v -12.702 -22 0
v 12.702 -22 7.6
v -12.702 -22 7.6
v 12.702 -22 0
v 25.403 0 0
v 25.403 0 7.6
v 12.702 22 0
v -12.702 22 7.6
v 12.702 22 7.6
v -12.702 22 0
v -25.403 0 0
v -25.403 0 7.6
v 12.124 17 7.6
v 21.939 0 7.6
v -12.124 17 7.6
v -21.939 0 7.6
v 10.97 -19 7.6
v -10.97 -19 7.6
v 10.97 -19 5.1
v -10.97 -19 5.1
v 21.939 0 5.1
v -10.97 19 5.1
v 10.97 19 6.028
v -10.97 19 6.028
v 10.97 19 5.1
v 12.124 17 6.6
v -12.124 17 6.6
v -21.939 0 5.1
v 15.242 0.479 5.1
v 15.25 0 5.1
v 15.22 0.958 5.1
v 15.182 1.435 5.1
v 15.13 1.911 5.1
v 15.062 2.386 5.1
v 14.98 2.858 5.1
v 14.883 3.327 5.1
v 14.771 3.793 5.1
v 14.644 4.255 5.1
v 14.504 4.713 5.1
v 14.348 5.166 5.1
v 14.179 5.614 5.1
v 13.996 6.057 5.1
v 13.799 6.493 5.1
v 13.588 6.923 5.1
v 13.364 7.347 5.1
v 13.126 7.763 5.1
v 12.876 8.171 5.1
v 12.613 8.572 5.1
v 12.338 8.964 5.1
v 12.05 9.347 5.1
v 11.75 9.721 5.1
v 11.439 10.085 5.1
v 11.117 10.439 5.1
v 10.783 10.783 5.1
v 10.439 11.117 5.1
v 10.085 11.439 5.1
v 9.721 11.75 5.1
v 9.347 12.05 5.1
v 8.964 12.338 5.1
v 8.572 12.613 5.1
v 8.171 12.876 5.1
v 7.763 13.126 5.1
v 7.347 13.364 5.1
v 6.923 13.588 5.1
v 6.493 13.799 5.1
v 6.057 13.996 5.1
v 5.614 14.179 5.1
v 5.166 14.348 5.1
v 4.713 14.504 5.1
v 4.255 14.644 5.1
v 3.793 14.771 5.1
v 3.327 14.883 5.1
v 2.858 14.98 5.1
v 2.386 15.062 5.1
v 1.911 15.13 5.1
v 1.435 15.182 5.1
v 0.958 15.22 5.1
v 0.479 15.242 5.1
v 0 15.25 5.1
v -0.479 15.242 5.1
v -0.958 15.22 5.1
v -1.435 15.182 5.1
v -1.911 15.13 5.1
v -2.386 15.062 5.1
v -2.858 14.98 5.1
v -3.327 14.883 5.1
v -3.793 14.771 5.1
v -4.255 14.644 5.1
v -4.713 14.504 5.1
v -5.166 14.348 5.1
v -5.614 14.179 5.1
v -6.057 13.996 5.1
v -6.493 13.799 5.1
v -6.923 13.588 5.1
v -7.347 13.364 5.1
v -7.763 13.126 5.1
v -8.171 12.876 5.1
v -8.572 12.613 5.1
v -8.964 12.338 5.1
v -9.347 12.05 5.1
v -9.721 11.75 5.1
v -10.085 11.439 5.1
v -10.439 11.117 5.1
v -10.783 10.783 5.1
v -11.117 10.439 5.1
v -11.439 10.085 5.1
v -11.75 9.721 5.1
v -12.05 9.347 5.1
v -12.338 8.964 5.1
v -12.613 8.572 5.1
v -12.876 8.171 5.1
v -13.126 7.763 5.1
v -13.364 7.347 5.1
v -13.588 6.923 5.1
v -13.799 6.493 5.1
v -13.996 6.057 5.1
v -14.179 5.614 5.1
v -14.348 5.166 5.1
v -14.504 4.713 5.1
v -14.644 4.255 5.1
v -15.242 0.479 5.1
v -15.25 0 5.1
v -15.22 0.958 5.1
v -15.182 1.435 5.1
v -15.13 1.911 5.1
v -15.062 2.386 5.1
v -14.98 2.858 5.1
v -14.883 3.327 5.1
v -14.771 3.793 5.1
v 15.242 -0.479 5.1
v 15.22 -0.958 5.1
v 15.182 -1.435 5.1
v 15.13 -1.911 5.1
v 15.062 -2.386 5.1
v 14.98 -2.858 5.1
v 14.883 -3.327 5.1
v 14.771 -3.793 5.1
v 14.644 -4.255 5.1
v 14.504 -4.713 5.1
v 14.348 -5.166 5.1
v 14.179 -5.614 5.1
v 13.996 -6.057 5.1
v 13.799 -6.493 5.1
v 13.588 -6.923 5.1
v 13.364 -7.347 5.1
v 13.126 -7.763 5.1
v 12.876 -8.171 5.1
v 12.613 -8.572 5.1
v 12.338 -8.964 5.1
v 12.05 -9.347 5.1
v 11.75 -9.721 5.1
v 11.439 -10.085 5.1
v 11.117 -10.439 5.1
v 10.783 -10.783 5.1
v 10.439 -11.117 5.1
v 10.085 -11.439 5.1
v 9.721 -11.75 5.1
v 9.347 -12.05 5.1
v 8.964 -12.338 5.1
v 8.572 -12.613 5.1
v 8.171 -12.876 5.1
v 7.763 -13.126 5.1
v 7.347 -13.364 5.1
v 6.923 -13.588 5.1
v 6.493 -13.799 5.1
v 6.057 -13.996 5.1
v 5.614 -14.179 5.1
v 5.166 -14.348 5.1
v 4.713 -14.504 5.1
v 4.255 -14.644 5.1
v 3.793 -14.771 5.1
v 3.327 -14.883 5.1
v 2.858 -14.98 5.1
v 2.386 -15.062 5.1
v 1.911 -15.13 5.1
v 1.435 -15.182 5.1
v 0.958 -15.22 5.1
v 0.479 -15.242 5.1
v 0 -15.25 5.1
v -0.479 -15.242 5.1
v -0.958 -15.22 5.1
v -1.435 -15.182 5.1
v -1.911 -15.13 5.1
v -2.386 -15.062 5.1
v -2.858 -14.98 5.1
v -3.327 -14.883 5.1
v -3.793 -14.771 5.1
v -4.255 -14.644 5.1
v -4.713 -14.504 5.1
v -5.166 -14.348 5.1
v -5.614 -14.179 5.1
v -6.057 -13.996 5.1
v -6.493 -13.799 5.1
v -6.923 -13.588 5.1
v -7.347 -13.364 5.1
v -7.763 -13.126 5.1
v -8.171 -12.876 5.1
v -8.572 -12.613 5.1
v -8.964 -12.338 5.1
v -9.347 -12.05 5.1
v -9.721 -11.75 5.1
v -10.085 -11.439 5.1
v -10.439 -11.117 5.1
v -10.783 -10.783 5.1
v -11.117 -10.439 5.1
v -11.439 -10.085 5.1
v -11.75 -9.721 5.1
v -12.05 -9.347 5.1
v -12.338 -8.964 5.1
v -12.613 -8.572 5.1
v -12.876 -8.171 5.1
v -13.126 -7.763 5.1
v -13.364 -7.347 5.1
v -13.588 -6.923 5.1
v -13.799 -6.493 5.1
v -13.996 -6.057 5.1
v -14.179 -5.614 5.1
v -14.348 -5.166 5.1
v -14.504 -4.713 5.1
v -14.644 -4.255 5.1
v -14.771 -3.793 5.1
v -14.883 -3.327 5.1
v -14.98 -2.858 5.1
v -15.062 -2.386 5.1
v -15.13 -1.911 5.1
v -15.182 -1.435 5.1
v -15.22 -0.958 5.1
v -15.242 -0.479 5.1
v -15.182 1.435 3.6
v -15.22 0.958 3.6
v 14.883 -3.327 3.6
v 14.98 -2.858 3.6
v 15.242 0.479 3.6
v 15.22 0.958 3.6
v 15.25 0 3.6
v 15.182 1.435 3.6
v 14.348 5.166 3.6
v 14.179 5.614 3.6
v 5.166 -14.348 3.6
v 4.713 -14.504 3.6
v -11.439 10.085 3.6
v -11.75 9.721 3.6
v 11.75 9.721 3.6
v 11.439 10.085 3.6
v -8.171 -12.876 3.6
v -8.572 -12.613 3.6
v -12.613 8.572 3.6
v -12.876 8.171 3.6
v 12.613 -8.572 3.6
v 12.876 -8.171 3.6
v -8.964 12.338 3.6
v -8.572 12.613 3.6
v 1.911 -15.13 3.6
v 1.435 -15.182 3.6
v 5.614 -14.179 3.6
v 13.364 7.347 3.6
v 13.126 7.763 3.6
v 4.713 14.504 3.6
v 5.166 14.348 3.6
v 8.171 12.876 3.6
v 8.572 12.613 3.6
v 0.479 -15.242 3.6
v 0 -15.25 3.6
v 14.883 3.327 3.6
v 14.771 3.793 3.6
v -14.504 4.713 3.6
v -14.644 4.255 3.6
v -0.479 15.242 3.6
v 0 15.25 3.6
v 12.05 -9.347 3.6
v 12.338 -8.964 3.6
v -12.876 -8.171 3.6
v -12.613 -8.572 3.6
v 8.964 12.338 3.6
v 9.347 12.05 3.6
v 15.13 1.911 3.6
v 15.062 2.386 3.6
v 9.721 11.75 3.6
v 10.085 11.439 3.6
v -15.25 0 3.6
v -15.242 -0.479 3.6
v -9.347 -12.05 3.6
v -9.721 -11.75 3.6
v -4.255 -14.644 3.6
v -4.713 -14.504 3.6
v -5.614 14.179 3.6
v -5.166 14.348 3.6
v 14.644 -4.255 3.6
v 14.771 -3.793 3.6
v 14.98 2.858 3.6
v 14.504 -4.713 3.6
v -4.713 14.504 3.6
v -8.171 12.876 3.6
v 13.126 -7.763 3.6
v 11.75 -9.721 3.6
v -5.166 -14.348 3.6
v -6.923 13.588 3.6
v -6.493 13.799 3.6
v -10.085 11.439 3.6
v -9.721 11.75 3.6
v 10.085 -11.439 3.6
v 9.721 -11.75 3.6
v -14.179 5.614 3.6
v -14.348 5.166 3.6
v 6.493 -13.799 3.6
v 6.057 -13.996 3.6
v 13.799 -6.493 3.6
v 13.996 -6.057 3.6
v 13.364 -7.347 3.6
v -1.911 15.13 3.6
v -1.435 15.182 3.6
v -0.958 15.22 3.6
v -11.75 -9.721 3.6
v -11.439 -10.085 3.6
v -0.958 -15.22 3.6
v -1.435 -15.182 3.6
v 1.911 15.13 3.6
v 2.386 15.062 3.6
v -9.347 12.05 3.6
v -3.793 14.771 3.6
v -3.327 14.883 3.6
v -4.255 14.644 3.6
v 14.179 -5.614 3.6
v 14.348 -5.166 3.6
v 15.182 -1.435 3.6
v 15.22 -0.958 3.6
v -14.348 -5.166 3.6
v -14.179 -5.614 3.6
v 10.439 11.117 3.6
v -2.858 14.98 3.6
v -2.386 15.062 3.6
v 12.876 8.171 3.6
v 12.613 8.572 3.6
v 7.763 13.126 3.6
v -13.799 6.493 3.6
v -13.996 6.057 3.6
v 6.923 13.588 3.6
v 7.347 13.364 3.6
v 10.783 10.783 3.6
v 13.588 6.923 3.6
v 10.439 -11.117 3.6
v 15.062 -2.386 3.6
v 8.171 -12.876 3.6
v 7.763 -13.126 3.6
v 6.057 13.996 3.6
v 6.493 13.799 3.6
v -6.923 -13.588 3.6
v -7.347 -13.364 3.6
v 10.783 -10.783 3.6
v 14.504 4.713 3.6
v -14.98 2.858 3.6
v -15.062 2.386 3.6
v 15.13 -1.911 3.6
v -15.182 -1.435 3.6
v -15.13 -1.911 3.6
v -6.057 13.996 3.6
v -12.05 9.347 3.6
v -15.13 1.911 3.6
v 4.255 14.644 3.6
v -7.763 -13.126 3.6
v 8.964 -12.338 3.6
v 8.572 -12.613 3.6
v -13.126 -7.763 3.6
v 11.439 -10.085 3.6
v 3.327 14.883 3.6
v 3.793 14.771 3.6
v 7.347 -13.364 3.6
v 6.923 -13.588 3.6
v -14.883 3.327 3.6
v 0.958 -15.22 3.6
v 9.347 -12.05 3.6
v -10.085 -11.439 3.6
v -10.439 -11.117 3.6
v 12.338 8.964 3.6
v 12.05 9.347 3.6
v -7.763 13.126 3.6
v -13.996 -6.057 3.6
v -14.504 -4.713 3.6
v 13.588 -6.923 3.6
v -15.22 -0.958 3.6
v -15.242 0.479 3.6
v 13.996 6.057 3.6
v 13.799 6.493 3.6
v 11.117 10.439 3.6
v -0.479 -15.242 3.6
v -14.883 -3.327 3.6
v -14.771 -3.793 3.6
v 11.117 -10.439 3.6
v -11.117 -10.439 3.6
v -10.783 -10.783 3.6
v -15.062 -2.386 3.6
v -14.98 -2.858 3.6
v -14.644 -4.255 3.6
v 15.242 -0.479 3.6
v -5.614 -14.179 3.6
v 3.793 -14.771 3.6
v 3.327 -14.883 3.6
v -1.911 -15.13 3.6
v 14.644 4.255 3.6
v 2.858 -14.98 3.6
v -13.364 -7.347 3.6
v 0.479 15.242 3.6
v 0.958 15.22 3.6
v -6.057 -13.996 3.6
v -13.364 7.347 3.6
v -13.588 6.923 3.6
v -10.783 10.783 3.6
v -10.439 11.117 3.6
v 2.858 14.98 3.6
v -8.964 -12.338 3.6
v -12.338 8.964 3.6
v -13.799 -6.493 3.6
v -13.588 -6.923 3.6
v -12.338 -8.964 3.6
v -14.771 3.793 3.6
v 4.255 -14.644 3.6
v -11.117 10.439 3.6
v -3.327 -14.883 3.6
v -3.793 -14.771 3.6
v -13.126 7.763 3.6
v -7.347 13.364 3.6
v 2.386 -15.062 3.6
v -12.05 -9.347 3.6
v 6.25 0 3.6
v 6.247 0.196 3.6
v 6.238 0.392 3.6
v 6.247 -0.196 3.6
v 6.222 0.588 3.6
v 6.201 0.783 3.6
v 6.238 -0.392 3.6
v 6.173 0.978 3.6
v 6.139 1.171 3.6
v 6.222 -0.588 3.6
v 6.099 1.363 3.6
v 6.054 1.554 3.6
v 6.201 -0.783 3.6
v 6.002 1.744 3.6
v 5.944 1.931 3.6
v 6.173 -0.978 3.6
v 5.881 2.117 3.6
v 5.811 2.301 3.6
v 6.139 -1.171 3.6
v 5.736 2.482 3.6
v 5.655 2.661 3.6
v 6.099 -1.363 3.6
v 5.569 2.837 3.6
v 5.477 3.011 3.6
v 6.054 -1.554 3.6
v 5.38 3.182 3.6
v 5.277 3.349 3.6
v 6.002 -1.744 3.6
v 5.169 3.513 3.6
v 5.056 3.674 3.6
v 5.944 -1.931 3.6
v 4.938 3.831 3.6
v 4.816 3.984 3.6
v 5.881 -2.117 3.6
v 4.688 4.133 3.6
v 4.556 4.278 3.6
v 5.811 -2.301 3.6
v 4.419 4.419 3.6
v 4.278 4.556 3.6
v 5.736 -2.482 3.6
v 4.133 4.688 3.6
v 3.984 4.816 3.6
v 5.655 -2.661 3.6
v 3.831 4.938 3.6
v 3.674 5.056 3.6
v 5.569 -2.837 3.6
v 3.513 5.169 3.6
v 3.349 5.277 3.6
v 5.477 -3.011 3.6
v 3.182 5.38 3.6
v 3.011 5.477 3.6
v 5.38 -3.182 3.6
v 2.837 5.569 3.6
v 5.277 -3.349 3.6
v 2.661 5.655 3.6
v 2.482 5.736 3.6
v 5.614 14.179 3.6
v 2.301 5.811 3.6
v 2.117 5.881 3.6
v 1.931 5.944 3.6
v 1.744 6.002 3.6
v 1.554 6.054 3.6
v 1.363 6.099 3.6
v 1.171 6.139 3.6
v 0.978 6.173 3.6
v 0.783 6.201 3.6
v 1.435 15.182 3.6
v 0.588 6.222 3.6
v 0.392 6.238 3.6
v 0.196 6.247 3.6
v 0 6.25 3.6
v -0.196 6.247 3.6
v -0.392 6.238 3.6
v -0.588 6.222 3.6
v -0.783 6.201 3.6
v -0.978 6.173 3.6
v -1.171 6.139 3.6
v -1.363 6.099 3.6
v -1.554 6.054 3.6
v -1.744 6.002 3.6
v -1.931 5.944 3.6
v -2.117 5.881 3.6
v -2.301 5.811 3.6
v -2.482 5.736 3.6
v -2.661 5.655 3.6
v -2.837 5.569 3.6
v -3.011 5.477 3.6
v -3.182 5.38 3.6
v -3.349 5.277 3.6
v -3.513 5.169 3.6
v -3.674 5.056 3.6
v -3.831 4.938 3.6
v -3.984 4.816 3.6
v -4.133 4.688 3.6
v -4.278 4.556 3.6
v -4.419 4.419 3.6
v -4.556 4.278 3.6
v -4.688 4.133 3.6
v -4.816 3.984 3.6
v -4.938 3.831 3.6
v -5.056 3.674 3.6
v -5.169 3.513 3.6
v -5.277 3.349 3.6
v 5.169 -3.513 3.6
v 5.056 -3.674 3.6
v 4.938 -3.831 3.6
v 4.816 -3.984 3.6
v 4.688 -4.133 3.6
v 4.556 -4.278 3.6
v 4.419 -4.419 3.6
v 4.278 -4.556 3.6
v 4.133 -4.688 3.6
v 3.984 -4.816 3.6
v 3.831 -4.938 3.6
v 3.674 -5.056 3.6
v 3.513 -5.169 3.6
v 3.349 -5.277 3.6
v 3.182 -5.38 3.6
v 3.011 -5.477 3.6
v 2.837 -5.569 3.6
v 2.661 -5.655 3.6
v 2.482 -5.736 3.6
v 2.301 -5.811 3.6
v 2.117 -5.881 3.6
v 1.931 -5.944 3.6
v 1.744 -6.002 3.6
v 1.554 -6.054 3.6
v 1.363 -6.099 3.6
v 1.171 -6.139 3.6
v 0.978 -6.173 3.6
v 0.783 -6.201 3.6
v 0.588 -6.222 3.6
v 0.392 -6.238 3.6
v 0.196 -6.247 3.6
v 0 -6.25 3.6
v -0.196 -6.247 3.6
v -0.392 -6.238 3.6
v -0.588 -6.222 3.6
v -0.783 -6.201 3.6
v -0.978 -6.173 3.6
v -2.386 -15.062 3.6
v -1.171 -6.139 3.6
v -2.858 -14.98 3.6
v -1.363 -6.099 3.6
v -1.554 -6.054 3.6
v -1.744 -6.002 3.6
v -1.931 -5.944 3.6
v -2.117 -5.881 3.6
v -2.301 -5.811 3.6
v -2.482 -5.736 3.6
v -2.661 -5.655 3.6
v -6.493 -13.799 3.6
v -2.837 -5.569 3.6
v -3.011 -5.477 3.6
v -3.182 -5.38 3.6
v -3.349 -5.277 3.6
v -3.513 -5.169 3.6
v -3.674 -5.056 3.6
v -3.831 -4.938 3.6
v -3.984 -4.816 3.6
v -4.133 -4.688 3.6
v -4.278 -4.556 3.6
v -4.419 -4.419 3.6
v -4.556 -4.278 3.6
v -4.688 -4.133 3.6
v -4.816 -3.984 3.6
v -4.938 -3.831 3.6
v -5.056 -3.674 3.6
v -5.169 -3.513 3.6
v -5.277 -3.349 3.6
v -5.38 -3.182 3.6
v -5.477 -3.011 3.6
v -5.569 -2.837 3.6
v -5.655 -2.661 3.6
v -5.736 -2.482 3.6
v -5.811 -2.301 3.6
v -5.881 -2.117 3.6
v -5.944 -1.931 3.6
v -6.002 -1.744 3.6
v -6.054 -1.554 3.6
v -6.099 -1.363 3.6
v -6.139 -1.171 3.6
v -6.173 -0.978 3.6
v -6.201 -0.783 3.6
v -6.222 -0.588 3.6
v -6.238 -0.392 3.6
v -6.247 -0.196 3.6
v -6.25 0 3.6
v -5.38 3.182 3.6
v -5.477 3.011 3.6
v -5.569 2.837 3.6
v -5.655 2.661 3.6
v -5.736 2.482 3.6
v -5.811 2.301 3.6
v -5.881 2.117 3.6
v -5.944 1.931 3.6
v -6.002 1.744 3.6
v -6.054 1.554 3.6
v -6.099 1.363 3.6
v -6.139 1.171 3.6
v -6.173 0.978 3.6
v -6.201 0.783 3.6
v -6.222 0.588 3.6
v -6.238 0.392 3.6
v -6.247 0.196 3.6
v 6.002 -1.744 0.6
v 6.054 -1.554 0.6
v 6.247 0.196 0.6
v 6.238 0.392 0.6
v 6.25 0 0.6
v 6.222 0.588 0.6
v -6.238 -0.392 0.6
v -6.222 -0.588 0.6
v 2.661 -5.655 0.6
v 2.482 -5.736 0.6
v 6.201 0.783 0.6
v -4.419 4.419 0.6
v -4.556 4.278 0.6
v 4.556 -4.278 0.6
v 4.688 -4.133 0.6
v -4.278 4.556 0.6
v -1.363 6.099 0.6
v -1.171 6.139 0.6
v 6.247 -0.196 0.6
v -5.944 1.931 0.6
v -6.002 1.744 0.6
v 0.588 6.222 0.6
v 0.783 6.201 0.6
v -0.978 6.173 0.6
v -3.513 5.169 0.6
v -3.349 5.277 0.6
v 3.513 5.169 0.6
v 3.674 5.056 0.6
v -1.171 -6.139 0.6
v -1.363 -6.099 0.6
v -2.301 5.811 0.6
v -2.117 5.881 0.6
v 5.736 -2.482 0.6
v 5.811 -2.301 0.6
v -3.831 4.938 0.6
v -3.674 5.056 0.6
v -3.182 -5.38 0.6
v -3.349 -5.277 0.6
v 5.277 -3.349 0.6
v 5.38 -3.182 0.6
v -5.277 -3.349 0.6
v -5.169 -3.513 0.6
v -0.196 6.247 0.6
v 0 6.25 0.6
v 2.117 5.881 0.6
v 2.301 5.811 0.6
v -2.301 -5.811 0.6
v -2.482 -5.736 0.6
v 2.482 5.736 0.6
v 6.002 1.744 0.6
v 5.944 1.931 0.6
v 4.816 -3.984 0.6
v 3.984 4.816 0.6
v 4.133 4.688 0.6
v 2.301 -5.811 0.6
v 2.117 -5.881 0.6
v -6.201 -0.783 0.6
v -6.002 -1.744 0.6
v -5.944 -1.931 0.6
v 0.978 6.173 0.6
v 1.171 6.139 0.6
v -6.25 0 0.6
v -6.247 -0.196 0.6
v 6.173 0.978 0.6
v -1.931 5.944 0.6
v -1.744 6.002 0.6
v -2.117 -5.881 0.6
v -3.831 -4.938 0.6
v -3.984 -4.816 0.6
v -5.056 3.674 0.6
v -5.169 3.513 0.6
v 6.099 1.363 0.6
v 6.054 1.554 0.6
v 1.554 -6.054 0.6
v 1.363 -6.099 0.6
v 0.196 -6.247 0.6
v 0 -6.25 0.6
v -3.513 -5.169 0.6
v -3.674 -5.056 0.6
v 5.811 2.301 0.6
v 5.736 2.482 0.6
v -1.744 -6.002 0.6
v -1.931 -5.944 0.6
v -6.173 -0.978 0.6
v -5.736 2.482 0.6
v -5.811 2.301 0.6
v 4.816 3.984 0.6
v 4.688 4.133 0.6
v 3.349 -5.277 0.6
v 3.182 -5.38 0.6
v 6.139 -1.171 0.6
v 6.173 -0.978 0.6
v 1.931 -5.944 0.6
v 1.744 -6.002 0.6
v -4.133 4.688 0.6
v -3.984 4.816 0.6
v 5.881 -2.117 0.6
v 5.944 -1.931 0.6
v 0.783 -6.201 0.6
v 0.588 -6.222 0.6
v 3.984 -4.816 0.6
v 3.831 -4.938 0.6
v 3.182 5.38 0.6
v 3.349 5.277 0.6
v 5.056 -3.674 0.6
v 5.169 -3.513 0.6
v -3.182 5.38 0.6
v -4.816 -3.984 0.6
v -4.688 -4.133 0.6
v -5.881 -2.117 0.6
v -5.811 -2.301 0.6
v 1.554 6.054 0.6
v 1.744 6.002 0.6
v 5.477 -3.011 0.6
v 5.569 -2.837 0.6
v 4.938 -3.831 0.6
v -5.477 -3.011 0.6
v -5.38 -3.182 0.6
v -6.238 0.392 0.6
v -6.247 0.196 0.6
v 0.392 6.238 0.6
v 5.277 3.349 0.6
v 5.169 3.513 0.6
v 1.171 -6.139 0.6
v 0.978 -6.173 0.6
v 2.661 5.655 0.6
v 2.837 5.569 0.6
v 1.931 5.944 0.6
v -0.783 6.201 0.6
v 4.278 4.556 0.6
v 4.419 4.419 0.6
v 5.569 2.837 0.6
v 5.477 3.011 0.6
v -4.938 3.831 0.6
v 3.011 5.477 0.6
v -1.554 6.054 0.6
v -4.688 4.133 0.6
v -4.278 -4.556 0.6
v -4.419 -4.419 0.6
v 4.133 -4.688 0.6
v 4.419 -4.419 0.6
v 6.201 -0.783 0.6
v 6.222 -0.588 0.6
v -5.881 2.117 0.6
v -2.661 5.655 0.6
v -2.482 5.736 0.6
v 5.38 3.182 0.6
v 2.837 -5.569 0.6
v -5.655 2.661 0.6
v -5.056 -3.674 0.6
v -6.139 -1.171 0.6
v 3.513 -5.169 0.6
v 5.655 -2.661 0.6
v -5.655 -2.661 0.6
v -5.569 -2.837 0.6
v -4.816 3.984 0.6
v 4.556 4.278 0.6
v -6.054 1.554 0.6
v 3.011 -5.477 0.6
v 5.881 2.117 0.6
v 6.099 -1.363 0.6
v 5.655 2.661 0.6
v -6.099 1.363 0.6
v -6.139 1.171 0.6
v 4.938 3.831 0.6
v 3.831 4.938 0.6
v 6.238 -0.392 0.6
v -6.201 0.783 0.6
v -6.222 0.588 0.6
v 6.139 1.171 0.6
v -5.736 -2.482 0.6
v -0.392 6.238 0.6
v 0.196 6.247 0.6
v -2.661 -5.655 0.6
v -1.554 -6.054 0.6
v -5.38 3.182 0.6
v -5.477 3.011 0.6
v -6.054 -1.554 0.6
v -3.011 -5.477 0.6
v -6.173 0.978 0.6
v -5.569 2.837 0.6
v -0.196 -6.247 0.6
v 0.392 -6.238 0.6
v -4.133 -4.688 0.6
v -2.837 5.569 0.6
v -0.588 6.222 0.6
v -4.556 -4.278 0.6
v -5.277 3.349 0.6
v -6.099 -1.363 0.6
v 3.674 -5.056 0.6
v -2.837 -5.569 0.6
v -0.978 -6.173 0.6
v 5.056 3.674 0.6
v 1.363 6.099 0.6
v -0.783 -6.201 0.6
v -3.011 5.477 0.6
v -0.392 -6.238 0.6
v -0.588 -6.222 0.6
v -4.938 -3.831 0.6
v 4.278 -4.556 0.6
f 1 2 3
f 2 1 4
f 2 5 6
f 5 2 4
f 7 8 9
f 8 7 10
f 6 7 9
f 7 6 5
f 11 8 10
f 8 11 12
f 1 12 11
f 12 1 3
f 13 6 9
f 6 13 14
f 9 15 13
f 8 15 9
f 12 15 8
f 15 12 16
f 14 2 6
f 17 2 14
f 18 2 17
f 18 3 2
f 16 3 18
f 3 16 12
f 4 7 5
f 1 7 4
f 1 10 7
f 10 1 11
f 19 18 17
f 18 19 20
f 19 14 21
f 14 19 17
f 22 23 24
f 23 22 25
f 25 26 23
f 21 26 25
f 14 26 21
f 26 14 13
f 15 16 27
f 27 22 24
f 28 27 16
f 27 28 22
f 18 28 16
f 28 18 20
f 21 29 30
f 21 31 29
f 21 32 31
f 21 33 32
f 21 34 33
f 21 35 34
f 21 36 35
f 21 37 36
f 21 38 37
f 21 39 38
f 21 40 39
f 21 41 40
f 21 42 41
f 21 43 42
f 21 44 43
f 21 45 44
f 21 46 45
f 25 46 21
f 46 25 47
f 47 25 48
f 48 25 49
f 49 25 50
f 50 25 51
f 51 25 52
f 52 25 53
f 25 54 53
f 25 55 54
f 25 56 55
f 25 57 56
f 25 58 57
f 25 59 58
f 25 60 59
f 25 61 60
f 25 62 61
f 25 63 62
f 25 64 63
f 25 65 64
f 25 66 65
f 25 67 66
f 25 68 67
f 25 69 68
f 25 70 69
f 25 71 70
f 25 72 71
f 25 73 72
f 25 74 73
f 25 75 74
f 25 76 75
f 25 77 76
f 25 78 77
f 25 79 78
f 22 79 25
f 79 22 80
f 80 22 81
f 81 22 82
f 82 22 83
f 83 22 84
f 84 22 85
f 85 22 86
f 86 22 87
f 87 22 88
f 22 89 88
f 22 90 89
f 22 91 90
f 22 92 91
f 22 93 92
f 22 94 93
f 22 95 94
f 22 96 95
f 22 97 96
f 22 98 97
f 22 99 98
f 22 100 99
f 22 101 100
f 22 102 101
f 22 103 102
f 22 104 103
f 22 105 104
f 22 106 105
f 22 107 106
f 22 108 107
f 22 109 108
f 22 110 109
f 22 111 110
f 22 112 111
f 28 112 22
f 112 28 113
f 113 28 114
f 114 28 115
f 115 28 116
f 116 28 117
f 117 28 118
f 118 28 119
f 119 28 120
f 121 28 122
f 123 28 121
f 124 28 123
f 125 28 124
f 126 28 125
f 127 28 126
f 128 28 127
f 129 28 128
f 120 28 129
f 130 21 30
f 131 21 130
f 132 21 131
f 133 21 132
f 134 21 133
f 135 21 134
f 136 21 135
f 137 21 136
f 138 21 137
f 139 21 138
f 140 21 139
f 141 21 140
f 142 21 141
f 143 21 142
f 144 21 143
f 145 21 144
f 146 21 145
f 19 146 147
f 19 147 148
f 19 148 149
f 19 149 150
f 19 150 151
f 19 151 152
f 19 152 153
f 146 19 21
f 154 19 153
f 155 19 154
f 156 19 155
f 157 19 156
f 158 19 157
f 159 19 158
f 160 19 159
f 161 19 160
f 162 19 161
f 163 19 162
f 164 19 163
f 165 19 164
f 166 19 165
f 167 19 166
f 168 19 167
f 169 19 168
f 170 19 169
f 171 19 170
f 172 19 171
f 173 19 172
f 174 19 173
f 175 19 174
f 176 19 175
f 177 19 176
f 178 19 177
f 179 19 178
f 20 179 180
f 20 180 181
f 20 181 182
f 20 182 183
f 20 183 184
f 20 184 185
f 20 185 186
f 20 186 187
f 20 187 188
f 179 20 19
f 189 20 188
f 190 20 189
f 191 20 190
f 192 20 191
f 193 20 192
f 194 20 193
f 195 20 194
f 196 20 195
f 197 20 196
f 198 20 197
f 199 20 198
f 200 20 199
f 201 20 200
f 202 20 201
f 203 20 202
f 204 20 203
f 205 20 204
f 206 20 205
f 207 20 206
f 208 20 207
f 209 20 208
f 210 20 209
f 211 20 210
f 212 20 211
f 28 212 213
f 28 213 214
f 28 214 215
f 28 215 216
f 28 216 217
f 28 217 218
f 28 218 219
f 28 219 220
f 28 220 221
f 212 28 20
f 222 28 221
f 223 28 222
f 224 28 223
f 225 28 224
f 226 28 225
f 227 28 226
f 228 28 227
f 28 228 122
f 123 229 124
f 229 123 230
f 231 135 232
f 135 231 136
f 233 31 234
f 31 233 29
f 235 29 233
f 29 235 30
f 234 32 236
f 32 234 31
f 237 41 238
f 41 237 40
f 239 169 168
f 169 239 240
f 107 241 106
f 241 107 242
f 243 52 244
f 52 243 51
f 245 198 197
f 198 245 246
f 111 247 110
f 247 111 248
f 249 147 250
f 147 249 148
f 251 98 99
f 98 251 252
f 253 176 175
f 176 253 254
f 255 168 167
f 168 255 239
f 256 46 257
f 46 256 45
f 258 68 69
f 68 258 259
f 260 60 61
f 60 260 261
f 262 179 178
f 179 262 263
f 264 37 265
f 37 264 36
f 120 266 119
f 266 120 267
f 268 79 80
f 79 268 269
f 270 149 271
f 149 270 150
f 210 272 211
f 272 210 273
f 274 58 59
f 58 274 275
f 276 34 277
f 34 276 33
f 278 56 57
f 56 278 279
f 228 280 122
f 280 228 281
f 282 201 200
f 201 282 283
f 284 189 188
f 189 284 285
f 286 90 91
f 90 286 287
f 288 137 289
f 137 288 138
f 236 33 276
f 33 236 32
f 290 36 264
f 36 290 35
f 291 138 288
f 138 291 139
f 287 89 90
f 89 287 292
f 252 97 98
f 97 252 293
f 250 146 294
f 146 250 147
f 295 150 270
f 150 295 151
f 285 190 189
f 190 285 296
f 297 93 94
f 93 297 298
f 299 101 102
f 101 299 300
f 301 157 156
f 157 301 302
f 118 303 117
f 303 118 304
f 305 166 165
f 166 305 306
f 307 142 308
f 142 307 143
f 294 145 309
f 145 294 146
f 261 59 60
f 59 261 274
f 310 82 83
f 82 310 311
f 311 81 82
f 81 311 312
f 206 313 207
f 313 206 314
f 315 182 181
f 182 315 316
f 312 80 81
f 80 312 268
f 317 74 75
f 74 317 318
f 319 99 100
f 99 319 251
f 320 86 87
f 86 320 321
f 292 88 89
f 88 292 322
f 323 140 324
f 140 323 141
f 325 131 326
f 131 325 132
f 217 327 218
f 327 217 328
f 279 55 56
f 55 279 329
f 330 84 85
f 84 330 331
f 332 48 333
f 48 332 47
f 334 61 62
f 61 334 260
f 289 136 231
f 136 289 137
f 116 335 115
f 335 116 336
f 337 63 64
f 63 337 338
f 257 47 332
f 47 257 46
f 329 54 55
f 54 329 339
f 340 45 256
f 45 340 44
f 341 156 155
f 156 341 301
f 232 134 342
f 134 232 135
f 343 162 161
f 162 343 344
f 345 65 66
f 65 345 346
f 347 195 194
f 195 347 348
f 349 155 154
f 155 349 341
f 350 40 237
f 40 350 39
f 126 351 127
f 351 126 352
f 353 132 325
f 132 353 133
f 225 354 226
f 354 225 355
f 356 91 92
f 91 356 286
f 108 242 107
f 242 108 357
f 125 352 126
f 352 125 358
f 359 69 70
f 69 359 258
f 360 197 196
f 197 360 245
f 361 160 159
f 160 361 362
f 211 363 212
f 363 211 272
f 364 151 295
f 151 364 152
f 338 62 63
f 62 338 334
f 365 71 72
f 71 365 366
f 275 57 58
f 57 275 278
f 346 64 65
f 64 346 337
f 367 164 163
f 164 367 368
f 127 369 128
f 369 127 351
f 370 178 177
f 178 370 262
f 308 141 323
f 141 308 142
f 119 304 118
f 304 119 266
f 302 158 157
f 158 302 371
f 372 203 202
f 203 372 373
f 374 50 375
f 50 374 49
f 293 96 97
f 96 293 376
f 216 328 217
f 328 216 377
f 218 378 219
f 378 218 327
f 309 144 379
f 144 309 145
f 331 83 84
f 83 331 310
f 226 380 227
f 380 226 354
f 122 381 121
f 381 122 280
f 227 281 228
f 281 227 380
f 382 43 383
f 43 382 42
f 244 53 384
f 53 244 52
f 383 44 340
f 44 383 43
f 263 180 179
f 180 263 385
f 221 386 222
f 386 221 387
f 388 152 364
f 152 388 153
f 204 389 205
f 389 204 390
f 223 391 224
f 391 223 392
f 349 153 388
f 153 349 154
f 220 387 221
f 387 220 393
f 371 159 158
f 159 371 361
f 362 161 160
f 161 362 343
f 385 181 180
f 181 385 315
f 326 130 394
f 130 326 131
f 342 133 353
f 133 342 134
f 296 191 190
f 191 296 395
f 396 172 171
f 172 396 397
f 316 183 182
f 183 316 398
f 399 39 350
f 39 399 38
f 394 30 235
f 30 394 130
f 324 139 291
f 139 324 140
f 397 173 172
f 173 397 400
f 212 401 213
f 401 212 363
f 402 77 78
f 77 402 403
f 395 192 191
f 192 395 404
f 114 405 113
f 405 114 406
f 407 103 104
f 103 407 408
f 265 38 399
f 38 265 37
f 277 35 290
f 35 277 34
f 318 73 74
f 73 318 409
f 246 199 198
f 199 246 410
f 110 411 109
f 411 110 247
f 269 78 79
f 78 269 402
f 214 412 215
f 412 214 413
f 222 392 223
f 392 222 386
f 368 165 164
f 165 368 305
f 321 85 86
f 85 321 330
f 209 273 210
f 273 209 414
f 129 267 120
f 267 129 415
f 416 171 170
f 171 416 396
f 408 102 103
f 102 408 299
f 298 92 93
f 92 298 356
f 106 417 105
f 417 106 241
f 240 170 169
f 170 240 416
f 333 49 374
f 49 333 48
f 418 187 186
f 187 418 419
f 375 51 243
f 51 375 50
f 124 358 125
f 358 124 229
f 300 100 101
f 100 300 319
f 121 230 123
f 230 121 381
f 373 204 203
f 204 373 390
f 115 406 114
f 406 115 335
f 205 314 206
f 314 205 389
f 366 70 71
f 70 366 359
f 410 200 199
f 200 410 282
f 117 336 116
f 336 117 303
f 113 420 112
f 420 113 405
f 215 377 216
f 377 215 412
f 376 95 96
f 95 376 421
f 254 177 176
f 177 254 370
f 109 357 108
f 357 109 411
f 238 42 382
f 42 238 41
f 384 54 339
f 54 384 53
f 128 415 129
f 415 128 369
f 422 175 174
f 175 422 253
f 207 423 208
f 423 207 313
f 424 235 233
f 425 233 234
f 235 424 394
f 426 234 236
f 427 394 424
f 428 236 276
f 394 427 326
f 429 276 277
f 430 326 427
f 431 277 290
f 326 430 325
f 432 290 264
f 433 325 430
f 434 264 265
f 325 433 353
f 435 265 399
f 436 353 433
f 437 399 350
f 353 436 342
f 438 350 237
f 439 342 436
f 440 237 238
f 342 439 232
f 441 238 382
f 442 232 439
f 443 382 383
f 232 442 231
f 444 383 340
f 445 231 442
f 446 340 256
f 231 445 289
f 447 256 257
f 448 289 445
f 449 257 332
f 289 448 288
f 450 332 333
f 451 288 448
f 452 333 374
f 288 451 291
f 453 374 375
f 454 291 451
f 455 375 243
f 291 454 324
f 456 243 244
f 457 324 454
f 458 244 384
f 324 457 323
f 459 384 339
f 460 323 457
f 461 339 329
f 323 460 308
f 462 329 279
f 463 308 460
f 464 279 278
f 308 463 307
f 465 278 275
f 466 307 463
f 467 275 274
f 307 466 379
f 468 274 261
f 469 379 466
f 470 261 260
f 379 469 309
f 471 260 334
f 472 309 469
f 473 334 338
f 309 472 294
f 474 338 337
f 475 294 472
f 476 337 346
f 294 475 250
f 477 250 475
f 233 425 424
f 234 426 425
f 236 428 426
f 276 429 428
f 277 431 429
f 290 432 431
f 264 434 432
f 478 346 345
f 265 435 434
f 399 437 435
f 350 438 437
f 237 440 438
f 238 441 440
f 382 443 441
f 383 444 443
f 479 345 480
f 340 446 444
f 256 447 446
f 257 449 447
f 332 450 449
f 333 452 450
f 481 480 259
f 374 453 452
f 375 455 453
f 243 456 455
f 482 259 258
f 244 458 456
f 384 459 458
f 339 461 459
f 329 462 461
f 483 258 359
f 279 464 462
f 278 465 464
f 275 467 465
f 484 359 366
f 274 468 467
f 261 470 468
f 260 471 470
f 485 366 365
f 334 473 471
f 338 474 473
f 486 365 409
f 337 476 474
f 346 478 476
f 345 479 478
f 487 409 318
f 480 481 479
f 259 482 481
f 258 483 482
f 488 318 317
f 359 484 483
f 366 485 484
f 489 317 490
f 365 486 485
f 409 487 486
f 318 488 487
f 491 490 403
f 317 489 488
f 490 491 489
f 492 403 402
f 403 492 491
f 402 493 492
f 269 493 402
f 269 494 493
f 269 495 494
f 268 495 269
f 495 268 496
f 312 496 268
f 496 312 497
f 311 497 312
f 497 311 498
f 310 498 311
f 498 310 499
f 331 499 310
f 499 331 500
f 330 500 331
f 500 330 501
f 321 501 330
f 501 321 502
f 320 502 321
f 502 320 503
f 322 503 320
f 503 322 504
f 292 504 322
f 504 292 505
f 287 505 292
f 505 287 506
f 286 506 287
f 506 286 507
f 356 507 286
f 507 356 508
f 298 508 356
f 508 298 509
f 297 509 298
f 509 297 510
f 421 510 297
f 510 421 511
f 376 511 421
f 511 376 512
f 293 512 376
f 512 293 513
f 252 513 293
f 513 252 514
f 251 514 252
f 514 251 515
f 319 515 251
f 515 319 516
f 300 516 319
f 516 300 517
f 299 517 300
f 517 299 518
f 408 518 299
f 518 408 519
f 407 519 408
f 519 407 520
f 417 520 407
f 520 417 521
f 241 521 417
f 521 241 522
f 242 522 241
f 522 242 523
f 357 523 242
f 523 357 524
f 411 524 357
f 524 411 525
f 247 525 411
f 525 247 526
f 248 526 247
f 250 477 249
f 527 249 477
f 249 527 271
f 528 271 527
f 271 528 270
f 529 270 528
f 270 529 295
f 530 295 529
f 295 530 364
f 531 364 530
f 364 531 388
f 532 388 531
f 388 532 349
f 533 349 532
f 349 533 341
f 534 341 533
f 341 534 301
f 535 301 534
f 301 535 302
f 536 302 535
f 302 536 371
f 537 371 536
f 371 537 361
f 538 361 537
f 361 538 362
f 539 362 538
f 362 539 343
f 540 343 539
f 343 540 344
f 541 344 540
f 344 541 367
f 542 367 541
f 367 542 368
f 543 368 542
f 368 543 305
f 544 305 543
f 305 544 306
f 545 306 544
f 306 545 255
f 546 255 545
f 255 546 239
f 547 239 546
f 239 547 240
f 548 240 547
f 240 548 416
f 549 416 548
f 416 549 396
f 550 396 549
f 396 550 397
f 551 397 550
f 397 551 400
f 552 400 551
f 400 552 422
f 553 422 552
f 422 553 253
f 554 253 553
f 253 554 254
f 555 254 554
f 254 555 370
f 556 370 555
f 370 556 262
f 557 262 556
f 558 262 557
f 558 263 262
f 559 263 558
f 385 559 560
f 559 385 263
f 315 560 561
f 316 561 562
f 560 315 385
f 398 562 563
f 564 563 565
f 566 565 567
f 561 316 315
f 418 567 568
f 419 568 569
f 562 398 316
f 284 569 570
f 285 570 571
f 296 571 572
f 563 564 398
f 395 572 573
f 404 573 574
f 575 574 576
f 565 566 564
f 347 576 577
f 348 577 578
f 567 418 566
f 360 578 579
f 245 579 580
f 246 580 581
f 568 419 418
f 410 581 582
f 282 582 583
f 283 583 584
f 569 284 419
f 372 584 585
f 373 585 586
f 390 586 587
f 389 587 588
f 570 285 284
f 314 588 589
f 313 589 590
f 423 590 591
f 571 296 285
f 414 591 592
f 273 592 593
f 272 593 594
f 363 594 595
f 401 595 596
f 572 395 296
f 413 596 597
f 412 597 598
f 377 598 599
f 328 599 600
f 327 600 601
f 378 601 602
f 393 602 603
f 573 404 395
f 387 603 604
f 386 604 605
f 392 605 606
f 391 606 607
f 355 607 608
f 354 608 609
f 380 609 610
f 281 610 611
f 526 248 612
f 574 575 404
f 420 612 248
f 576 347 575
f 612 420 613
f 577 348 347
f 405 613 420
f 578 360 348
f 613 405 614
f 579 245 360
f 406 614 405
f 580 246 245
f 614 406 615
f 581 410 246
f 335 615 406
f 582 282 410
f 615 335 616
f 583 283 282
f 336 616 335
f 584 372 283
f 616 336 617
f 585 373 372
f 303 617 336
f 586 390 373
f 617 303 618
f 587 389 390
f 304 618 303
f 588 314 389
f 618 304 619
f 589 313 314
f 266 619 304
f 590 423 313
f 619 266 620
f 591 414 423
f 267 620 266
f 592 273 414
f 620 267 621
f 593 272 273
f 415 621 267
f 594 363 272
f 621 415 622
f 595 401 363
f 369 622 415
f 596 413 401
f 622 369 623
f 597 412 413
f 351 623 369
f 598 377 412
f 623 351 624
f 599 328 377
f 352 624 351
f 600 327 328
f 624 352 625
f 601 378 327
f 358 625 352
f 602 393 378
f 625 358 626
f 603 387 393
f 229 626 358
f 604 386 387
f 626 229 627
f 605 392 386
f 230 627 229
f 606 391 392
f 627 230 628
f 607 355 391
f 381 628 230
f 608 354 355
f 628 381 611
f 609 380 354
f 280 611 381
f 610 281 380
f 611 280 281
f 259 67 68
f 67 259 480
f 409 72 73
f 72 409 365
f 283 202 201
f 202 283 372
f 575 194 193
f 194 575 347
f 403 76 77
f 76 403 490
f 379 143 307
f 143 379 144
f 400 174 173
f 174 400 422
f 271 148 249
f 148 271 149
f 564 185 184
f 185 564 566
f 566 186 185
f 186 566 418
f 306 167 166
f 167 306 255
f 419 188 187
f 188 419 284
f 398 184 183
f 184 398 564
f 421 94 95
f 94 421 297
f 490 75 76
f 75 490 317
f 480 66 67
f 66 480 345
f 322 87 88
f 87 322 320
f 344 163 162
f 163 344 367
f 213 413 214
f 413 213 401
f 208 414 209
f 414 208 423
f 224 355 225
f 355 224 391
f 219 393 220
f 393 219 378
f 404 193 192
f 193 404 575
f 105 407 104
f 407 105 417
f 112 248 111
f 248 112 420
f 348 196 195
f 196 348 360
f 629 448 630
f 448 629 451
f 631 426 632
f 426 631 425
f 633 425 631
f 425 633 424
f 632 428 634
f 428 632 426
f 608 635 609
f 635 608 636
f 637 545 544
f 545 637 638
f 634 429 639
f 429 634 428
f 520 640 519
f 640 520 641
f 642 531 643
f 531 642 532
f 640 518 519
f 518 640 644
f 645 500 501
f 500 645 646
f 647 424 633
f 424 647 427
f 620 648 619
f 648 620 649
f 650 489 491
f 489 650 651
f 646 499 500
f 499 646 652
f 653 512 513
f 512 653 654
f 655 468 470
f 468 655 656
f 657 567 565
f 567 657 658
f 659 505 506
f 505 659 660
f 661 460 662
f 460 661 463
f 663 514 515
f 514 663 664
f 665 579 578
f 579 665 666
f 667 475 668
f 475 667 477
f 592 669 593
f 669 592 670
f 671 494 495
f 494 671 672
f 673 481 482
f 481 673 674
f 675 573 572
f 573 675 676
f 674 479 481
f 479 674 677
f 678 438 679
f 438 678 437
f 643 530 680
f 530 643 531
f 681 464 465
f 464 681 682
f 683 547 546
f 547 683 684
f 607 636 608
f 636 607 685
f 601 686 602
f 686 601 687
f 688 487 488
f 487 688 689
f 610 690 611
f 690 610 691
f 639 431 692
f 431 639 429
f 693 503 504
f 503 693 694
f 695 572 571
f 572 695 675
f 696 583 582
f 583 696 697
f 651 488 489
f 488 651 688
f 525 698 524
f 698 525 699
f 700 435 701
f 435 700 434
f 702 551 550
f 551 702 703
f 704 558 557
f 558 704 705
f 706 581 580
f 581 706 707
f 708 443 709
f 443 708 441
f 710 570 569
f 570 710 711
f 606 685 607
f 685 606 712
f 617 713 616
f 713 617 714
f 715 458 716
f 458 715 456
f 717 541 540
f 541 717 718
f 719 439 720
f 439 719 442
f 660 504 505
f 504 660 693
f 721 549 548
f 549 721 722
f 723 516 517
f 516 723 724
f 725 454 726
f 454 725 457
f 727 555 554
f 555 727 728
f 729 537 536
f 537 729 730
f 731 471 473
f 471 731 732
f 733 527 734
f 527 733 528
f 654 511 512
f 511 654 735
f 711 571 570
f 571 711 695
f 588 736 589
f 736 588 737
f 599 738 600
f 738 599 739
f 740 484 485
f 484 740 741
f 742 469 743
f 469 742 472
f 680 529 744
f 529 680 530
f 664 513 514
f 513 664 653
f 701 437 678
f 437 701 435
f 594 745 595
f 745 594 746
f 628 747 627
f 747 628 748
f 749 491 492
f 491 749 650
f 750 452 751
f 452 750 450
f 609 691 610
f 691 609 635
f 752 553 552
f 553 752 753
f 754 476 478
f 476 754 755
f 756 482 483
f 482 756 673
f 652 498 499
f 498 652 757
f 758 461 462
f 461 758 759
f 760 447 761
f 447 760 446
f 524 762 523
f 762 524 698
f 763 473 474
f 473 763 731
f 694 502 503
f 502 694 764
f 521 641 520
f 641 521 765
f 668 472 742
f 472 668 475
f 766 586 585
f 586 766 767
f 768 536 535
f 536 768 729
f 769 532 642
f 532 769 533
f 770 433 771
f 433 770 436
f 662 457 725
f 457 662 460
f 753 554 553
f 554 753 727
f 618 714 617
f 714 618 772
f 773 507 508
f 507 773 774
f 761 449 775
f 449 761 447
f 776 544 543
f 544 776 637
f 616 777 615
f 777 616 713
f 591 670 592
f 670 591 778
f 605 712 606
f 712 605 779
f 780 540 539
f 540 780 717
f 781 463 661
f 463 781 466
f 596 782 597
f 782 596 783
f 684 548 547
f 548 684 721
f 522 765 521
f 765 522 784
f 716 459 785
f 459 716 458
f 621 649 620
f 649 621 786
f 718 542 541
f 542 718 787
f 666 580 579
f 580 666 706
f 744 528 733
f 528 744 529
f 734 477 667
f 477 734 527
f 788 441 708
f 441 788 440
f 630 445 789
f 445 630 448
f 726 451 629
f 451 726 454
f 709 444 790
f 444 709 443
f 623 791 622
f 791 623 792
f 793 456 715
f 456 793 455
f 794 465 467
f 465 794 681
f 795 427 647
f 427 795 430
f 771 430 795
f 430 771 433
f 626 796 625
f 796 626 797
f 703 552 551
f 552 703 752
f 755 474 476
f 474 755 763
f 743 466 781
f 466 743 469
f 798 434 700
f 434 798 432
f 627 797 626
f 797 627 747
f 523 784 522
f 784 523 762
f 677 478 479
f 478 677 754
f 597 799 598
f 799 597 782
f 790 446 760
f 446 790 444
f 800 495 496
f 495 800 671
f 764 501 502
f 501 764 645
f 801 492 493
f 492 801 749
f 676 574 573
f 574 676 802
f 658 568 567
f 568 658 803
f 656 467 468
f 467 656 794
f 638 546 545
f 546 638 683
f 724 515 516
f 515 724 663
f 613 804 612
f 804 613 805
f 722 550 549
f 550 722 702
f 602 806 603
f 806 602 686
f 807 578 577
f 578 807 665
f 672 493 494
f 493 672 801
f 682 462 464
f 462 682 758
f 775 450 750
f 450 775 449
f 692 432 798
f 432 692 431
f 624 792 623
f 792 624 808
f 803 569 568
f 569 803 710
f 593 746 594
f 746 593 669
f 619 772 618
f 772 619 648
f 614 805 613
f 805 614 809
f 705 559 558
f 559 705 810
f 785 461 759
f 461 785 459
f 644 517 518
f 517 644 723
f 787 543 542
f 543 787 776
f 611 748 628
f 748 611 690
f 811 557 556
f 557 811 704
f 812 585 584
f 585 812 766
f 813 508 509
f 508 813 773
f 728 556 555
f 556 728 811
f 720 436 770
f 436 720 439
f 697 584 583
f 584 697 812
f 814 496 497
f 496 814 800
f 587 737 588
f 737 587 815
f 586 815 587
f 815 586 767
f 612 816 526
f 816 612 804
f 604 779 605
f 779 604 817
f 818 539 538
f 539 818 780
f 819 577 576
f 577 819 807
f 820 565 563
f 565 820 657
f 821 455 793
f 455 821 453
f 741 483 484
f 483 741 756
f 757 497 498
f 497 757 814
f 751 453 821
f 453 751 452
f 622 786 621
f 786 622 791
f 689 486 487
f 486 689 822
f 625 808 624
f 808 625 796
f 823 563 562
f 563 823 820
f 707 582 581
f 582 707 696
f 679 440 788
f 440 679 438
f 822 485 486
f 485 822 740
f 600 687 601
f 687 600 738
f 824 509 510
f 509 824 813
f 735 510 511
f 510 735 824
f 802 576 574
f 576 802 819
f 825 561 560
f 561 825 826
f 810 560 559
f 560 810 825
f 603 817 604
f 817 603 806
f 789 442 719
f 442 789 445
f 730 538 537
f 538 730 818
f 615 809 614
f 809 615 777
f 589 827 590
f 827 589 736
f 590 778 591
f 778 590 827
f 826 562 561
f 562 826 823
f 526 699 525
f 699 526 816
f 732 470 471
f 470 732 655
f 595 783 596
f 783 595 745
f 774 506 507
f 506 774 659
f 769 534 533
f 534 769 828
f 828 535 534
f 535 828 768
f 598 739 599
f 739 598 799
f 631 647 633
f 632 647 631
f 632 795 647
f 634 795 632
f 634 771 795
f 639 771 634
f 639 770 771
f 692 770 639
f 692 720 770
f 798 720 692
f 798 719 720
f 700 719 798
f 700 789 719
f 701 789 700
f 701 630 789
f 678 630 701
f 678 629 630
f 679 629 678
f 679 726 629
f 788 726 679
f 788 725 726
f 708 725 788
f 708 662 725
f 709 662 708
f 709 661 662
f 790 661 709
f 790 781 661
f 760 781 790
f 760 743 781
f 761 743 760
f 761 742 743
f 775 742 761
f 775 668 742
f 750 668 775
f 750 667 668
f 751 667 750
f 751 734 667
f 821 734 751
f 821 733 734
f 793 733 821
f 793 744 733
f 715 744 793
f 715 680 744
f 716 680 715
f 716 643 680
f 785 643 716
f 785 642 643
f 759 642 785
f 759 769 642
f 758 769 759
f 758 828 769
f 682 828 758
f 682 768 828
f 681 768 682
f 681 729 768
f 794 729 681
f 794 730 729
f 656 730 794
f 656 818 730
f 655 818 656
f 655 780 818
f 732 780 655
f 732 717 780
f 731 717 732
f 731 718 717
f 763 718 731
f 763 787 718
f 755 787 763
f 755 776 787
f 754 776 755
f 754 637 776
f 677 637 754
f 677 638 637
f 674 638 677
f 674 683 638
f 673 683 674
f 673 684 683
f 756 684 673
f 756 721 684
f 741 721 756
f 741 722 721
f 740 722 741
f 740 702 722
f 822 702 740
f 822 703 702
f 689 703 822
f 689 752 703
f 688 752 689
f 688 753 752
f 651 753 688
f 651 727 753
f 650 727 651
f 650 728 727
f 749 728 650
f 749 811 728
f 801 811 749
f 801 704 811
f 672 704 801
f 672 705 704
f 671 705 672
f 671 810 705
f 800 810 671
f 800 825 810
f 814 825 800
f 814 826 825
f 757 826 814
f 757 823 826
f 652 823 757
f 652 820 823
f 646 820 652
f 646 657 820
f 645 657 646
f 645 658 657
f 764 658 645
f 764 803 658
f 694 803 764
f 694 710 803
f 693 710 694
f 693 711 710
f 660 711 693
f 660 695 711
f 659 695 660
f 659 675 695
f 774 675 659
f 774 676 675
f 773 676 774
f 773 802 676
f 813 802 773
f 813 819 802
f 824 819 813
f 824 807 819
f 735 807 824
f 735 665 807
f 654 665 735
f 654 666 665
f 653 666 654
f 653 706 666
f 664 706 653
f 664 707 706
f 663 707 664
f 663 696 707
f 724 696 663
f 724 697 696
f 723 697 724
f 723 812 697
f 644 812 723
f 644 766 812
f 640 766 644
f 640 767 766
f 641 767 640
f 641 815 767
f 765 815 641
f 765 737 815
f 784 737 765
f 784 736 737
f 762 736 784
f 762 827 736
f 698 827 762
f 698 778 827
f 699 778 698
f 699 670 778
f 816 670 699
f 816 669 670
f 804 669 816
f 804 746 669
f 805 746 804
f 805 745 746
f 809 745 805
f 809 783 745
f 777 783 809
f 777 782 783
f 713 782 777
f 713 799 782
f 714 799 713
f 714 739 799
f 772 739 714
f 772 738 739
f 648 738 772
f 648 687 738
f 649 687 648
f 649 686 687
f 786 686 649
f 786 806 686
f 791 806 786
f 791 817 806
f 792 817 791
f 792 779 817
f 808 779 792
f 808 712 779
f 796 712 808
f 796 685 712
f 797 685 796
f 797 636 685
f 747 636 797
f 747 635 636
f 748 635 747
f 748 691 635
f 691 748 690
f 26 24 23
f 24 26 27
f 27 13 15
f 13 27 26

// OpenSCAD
//=============================================================================
// nespresso-holder.scad
//
// a holder for nespresso pods
//=============================================================================
// Written in 2017 by Patrick Barrett
//
// To the extent possible under law, the author(s) have dedicated all copyright
// and related and neighboring rights to this work to the public domain
// worldwide. This work is distributed without any warranty.
//
// See <http://creativecommons.org/publicdomain/zero/1.0/> for full dedication.
//=============================================================================

// dimensions
x = 1; // cell count, vertical, odd numbers only
y = 1; // cell count, horizontal, odd numbers only

shape = "hexagon"; // [hexagon|rectangle], overall shape

di = 38; // mm, main pod well indiameter
pod_well = 1.5; // mm, main pod well depth

blg_well = 1.5; // mm, buldge well depth
blg_dia = 30.5; // mm, buldge well depth

mag_well = 3; // mm, magnet well depth
mag_dia = 12.5; // mm, magnet diameter

lip_length = 2; // mm, top edge holder lip extension from edge
lip_depth = 1; // mm, top edge holder lip thickness
lip_angle_offset = 1; // mm, top edge holder lip angle offset

cell_wall = 3; // mm, cell side wall size
back_wall = 0.6; // mm, backing wall minimum size

// customizable variables end here

abit = 0.001; //use for making overlap to get single manifold stl
alot = 150;

$fn = 200;

Di = di * (2/sqrt(3)); // mm, circumdiameter of inner side of honeycomb

do = di + (2*cell_wall); // mm, inradius of outter side of honeycomb
Do = do * (2/sqrt(3)); // mm, circumdiameter of outter side of honeycomb

dm = (di+do)/2; // mm, inradius of median of honeycomb
Dm = (Di+Do)/2; // mm, circumdiameter of median of honeycomb

total_body_depth = back_wall + mag_well + blg_well + pod_well + lip_depth;
max_back_depth = back_wall + mag_well + blg_well;

x_min = -floor(x/2);
x_max = floor(x/2);
y_min = -floor(y/2);
y_max = floor(y/2);

// each pod cell
module cell() {
    union() {
        difference() {
            cylinder(d = Do, h = total_body_depth, $fn = 6);
            
            // main hex cut
            translate([0,0,max_back_depth])
            cylinder(d = Di, h = alot, $fn = 6);
            
            // buldge cut
            translate([0,0,max_back_depth-blg_well])
            cylinder(d = blg_dia, h = alot);
            
            // magnet cut
            translate([0,0,back_wall])
            cylinder(d = mag_dia, h = alot);
        }
        
        // add lip
        hull() {
            difference() {
                translate([0,0,total_body_depth - lip_depth])
                cylinder(d = Do, h = lip_depth, $fn = 6);
                translate([0,-alot/2 + di/2 - lip_length,0])
                cube([alot, alot, alot], center = true);
            }
            
            translate([0,
                       dm/2,
                       (lip_depth + lip_angle_offset)/2
                       + (total_body_depth - lip_depth - lip_angle_offset)])
            cube([dm/2, abit, lip_depth+lip_angle_offset], center=true);
        }
    }
}

// main body
union() {
    for(i = [x_min:x_max]){
        for(j=[ for (jj=[y_min:y_max]) jj+(0.5 * abs(i%2))]){
            // ^^^ adds 0.5 to odd cols ^^^
            hide = (shape != "hexagon")
            ? j == y_max && i%2 != 0
            : abs(j) > -0.5*(abs(i)) + (y_max - 0.5 * min(0, y_max-x_max))
              || abs(j) > y_max;
            
            if (!hide) {
                x = i * (dm * sqrt(3)/2);
                y = j * dm;
                translate([x,y,0])
                cell();
            }
        }
    }
}
